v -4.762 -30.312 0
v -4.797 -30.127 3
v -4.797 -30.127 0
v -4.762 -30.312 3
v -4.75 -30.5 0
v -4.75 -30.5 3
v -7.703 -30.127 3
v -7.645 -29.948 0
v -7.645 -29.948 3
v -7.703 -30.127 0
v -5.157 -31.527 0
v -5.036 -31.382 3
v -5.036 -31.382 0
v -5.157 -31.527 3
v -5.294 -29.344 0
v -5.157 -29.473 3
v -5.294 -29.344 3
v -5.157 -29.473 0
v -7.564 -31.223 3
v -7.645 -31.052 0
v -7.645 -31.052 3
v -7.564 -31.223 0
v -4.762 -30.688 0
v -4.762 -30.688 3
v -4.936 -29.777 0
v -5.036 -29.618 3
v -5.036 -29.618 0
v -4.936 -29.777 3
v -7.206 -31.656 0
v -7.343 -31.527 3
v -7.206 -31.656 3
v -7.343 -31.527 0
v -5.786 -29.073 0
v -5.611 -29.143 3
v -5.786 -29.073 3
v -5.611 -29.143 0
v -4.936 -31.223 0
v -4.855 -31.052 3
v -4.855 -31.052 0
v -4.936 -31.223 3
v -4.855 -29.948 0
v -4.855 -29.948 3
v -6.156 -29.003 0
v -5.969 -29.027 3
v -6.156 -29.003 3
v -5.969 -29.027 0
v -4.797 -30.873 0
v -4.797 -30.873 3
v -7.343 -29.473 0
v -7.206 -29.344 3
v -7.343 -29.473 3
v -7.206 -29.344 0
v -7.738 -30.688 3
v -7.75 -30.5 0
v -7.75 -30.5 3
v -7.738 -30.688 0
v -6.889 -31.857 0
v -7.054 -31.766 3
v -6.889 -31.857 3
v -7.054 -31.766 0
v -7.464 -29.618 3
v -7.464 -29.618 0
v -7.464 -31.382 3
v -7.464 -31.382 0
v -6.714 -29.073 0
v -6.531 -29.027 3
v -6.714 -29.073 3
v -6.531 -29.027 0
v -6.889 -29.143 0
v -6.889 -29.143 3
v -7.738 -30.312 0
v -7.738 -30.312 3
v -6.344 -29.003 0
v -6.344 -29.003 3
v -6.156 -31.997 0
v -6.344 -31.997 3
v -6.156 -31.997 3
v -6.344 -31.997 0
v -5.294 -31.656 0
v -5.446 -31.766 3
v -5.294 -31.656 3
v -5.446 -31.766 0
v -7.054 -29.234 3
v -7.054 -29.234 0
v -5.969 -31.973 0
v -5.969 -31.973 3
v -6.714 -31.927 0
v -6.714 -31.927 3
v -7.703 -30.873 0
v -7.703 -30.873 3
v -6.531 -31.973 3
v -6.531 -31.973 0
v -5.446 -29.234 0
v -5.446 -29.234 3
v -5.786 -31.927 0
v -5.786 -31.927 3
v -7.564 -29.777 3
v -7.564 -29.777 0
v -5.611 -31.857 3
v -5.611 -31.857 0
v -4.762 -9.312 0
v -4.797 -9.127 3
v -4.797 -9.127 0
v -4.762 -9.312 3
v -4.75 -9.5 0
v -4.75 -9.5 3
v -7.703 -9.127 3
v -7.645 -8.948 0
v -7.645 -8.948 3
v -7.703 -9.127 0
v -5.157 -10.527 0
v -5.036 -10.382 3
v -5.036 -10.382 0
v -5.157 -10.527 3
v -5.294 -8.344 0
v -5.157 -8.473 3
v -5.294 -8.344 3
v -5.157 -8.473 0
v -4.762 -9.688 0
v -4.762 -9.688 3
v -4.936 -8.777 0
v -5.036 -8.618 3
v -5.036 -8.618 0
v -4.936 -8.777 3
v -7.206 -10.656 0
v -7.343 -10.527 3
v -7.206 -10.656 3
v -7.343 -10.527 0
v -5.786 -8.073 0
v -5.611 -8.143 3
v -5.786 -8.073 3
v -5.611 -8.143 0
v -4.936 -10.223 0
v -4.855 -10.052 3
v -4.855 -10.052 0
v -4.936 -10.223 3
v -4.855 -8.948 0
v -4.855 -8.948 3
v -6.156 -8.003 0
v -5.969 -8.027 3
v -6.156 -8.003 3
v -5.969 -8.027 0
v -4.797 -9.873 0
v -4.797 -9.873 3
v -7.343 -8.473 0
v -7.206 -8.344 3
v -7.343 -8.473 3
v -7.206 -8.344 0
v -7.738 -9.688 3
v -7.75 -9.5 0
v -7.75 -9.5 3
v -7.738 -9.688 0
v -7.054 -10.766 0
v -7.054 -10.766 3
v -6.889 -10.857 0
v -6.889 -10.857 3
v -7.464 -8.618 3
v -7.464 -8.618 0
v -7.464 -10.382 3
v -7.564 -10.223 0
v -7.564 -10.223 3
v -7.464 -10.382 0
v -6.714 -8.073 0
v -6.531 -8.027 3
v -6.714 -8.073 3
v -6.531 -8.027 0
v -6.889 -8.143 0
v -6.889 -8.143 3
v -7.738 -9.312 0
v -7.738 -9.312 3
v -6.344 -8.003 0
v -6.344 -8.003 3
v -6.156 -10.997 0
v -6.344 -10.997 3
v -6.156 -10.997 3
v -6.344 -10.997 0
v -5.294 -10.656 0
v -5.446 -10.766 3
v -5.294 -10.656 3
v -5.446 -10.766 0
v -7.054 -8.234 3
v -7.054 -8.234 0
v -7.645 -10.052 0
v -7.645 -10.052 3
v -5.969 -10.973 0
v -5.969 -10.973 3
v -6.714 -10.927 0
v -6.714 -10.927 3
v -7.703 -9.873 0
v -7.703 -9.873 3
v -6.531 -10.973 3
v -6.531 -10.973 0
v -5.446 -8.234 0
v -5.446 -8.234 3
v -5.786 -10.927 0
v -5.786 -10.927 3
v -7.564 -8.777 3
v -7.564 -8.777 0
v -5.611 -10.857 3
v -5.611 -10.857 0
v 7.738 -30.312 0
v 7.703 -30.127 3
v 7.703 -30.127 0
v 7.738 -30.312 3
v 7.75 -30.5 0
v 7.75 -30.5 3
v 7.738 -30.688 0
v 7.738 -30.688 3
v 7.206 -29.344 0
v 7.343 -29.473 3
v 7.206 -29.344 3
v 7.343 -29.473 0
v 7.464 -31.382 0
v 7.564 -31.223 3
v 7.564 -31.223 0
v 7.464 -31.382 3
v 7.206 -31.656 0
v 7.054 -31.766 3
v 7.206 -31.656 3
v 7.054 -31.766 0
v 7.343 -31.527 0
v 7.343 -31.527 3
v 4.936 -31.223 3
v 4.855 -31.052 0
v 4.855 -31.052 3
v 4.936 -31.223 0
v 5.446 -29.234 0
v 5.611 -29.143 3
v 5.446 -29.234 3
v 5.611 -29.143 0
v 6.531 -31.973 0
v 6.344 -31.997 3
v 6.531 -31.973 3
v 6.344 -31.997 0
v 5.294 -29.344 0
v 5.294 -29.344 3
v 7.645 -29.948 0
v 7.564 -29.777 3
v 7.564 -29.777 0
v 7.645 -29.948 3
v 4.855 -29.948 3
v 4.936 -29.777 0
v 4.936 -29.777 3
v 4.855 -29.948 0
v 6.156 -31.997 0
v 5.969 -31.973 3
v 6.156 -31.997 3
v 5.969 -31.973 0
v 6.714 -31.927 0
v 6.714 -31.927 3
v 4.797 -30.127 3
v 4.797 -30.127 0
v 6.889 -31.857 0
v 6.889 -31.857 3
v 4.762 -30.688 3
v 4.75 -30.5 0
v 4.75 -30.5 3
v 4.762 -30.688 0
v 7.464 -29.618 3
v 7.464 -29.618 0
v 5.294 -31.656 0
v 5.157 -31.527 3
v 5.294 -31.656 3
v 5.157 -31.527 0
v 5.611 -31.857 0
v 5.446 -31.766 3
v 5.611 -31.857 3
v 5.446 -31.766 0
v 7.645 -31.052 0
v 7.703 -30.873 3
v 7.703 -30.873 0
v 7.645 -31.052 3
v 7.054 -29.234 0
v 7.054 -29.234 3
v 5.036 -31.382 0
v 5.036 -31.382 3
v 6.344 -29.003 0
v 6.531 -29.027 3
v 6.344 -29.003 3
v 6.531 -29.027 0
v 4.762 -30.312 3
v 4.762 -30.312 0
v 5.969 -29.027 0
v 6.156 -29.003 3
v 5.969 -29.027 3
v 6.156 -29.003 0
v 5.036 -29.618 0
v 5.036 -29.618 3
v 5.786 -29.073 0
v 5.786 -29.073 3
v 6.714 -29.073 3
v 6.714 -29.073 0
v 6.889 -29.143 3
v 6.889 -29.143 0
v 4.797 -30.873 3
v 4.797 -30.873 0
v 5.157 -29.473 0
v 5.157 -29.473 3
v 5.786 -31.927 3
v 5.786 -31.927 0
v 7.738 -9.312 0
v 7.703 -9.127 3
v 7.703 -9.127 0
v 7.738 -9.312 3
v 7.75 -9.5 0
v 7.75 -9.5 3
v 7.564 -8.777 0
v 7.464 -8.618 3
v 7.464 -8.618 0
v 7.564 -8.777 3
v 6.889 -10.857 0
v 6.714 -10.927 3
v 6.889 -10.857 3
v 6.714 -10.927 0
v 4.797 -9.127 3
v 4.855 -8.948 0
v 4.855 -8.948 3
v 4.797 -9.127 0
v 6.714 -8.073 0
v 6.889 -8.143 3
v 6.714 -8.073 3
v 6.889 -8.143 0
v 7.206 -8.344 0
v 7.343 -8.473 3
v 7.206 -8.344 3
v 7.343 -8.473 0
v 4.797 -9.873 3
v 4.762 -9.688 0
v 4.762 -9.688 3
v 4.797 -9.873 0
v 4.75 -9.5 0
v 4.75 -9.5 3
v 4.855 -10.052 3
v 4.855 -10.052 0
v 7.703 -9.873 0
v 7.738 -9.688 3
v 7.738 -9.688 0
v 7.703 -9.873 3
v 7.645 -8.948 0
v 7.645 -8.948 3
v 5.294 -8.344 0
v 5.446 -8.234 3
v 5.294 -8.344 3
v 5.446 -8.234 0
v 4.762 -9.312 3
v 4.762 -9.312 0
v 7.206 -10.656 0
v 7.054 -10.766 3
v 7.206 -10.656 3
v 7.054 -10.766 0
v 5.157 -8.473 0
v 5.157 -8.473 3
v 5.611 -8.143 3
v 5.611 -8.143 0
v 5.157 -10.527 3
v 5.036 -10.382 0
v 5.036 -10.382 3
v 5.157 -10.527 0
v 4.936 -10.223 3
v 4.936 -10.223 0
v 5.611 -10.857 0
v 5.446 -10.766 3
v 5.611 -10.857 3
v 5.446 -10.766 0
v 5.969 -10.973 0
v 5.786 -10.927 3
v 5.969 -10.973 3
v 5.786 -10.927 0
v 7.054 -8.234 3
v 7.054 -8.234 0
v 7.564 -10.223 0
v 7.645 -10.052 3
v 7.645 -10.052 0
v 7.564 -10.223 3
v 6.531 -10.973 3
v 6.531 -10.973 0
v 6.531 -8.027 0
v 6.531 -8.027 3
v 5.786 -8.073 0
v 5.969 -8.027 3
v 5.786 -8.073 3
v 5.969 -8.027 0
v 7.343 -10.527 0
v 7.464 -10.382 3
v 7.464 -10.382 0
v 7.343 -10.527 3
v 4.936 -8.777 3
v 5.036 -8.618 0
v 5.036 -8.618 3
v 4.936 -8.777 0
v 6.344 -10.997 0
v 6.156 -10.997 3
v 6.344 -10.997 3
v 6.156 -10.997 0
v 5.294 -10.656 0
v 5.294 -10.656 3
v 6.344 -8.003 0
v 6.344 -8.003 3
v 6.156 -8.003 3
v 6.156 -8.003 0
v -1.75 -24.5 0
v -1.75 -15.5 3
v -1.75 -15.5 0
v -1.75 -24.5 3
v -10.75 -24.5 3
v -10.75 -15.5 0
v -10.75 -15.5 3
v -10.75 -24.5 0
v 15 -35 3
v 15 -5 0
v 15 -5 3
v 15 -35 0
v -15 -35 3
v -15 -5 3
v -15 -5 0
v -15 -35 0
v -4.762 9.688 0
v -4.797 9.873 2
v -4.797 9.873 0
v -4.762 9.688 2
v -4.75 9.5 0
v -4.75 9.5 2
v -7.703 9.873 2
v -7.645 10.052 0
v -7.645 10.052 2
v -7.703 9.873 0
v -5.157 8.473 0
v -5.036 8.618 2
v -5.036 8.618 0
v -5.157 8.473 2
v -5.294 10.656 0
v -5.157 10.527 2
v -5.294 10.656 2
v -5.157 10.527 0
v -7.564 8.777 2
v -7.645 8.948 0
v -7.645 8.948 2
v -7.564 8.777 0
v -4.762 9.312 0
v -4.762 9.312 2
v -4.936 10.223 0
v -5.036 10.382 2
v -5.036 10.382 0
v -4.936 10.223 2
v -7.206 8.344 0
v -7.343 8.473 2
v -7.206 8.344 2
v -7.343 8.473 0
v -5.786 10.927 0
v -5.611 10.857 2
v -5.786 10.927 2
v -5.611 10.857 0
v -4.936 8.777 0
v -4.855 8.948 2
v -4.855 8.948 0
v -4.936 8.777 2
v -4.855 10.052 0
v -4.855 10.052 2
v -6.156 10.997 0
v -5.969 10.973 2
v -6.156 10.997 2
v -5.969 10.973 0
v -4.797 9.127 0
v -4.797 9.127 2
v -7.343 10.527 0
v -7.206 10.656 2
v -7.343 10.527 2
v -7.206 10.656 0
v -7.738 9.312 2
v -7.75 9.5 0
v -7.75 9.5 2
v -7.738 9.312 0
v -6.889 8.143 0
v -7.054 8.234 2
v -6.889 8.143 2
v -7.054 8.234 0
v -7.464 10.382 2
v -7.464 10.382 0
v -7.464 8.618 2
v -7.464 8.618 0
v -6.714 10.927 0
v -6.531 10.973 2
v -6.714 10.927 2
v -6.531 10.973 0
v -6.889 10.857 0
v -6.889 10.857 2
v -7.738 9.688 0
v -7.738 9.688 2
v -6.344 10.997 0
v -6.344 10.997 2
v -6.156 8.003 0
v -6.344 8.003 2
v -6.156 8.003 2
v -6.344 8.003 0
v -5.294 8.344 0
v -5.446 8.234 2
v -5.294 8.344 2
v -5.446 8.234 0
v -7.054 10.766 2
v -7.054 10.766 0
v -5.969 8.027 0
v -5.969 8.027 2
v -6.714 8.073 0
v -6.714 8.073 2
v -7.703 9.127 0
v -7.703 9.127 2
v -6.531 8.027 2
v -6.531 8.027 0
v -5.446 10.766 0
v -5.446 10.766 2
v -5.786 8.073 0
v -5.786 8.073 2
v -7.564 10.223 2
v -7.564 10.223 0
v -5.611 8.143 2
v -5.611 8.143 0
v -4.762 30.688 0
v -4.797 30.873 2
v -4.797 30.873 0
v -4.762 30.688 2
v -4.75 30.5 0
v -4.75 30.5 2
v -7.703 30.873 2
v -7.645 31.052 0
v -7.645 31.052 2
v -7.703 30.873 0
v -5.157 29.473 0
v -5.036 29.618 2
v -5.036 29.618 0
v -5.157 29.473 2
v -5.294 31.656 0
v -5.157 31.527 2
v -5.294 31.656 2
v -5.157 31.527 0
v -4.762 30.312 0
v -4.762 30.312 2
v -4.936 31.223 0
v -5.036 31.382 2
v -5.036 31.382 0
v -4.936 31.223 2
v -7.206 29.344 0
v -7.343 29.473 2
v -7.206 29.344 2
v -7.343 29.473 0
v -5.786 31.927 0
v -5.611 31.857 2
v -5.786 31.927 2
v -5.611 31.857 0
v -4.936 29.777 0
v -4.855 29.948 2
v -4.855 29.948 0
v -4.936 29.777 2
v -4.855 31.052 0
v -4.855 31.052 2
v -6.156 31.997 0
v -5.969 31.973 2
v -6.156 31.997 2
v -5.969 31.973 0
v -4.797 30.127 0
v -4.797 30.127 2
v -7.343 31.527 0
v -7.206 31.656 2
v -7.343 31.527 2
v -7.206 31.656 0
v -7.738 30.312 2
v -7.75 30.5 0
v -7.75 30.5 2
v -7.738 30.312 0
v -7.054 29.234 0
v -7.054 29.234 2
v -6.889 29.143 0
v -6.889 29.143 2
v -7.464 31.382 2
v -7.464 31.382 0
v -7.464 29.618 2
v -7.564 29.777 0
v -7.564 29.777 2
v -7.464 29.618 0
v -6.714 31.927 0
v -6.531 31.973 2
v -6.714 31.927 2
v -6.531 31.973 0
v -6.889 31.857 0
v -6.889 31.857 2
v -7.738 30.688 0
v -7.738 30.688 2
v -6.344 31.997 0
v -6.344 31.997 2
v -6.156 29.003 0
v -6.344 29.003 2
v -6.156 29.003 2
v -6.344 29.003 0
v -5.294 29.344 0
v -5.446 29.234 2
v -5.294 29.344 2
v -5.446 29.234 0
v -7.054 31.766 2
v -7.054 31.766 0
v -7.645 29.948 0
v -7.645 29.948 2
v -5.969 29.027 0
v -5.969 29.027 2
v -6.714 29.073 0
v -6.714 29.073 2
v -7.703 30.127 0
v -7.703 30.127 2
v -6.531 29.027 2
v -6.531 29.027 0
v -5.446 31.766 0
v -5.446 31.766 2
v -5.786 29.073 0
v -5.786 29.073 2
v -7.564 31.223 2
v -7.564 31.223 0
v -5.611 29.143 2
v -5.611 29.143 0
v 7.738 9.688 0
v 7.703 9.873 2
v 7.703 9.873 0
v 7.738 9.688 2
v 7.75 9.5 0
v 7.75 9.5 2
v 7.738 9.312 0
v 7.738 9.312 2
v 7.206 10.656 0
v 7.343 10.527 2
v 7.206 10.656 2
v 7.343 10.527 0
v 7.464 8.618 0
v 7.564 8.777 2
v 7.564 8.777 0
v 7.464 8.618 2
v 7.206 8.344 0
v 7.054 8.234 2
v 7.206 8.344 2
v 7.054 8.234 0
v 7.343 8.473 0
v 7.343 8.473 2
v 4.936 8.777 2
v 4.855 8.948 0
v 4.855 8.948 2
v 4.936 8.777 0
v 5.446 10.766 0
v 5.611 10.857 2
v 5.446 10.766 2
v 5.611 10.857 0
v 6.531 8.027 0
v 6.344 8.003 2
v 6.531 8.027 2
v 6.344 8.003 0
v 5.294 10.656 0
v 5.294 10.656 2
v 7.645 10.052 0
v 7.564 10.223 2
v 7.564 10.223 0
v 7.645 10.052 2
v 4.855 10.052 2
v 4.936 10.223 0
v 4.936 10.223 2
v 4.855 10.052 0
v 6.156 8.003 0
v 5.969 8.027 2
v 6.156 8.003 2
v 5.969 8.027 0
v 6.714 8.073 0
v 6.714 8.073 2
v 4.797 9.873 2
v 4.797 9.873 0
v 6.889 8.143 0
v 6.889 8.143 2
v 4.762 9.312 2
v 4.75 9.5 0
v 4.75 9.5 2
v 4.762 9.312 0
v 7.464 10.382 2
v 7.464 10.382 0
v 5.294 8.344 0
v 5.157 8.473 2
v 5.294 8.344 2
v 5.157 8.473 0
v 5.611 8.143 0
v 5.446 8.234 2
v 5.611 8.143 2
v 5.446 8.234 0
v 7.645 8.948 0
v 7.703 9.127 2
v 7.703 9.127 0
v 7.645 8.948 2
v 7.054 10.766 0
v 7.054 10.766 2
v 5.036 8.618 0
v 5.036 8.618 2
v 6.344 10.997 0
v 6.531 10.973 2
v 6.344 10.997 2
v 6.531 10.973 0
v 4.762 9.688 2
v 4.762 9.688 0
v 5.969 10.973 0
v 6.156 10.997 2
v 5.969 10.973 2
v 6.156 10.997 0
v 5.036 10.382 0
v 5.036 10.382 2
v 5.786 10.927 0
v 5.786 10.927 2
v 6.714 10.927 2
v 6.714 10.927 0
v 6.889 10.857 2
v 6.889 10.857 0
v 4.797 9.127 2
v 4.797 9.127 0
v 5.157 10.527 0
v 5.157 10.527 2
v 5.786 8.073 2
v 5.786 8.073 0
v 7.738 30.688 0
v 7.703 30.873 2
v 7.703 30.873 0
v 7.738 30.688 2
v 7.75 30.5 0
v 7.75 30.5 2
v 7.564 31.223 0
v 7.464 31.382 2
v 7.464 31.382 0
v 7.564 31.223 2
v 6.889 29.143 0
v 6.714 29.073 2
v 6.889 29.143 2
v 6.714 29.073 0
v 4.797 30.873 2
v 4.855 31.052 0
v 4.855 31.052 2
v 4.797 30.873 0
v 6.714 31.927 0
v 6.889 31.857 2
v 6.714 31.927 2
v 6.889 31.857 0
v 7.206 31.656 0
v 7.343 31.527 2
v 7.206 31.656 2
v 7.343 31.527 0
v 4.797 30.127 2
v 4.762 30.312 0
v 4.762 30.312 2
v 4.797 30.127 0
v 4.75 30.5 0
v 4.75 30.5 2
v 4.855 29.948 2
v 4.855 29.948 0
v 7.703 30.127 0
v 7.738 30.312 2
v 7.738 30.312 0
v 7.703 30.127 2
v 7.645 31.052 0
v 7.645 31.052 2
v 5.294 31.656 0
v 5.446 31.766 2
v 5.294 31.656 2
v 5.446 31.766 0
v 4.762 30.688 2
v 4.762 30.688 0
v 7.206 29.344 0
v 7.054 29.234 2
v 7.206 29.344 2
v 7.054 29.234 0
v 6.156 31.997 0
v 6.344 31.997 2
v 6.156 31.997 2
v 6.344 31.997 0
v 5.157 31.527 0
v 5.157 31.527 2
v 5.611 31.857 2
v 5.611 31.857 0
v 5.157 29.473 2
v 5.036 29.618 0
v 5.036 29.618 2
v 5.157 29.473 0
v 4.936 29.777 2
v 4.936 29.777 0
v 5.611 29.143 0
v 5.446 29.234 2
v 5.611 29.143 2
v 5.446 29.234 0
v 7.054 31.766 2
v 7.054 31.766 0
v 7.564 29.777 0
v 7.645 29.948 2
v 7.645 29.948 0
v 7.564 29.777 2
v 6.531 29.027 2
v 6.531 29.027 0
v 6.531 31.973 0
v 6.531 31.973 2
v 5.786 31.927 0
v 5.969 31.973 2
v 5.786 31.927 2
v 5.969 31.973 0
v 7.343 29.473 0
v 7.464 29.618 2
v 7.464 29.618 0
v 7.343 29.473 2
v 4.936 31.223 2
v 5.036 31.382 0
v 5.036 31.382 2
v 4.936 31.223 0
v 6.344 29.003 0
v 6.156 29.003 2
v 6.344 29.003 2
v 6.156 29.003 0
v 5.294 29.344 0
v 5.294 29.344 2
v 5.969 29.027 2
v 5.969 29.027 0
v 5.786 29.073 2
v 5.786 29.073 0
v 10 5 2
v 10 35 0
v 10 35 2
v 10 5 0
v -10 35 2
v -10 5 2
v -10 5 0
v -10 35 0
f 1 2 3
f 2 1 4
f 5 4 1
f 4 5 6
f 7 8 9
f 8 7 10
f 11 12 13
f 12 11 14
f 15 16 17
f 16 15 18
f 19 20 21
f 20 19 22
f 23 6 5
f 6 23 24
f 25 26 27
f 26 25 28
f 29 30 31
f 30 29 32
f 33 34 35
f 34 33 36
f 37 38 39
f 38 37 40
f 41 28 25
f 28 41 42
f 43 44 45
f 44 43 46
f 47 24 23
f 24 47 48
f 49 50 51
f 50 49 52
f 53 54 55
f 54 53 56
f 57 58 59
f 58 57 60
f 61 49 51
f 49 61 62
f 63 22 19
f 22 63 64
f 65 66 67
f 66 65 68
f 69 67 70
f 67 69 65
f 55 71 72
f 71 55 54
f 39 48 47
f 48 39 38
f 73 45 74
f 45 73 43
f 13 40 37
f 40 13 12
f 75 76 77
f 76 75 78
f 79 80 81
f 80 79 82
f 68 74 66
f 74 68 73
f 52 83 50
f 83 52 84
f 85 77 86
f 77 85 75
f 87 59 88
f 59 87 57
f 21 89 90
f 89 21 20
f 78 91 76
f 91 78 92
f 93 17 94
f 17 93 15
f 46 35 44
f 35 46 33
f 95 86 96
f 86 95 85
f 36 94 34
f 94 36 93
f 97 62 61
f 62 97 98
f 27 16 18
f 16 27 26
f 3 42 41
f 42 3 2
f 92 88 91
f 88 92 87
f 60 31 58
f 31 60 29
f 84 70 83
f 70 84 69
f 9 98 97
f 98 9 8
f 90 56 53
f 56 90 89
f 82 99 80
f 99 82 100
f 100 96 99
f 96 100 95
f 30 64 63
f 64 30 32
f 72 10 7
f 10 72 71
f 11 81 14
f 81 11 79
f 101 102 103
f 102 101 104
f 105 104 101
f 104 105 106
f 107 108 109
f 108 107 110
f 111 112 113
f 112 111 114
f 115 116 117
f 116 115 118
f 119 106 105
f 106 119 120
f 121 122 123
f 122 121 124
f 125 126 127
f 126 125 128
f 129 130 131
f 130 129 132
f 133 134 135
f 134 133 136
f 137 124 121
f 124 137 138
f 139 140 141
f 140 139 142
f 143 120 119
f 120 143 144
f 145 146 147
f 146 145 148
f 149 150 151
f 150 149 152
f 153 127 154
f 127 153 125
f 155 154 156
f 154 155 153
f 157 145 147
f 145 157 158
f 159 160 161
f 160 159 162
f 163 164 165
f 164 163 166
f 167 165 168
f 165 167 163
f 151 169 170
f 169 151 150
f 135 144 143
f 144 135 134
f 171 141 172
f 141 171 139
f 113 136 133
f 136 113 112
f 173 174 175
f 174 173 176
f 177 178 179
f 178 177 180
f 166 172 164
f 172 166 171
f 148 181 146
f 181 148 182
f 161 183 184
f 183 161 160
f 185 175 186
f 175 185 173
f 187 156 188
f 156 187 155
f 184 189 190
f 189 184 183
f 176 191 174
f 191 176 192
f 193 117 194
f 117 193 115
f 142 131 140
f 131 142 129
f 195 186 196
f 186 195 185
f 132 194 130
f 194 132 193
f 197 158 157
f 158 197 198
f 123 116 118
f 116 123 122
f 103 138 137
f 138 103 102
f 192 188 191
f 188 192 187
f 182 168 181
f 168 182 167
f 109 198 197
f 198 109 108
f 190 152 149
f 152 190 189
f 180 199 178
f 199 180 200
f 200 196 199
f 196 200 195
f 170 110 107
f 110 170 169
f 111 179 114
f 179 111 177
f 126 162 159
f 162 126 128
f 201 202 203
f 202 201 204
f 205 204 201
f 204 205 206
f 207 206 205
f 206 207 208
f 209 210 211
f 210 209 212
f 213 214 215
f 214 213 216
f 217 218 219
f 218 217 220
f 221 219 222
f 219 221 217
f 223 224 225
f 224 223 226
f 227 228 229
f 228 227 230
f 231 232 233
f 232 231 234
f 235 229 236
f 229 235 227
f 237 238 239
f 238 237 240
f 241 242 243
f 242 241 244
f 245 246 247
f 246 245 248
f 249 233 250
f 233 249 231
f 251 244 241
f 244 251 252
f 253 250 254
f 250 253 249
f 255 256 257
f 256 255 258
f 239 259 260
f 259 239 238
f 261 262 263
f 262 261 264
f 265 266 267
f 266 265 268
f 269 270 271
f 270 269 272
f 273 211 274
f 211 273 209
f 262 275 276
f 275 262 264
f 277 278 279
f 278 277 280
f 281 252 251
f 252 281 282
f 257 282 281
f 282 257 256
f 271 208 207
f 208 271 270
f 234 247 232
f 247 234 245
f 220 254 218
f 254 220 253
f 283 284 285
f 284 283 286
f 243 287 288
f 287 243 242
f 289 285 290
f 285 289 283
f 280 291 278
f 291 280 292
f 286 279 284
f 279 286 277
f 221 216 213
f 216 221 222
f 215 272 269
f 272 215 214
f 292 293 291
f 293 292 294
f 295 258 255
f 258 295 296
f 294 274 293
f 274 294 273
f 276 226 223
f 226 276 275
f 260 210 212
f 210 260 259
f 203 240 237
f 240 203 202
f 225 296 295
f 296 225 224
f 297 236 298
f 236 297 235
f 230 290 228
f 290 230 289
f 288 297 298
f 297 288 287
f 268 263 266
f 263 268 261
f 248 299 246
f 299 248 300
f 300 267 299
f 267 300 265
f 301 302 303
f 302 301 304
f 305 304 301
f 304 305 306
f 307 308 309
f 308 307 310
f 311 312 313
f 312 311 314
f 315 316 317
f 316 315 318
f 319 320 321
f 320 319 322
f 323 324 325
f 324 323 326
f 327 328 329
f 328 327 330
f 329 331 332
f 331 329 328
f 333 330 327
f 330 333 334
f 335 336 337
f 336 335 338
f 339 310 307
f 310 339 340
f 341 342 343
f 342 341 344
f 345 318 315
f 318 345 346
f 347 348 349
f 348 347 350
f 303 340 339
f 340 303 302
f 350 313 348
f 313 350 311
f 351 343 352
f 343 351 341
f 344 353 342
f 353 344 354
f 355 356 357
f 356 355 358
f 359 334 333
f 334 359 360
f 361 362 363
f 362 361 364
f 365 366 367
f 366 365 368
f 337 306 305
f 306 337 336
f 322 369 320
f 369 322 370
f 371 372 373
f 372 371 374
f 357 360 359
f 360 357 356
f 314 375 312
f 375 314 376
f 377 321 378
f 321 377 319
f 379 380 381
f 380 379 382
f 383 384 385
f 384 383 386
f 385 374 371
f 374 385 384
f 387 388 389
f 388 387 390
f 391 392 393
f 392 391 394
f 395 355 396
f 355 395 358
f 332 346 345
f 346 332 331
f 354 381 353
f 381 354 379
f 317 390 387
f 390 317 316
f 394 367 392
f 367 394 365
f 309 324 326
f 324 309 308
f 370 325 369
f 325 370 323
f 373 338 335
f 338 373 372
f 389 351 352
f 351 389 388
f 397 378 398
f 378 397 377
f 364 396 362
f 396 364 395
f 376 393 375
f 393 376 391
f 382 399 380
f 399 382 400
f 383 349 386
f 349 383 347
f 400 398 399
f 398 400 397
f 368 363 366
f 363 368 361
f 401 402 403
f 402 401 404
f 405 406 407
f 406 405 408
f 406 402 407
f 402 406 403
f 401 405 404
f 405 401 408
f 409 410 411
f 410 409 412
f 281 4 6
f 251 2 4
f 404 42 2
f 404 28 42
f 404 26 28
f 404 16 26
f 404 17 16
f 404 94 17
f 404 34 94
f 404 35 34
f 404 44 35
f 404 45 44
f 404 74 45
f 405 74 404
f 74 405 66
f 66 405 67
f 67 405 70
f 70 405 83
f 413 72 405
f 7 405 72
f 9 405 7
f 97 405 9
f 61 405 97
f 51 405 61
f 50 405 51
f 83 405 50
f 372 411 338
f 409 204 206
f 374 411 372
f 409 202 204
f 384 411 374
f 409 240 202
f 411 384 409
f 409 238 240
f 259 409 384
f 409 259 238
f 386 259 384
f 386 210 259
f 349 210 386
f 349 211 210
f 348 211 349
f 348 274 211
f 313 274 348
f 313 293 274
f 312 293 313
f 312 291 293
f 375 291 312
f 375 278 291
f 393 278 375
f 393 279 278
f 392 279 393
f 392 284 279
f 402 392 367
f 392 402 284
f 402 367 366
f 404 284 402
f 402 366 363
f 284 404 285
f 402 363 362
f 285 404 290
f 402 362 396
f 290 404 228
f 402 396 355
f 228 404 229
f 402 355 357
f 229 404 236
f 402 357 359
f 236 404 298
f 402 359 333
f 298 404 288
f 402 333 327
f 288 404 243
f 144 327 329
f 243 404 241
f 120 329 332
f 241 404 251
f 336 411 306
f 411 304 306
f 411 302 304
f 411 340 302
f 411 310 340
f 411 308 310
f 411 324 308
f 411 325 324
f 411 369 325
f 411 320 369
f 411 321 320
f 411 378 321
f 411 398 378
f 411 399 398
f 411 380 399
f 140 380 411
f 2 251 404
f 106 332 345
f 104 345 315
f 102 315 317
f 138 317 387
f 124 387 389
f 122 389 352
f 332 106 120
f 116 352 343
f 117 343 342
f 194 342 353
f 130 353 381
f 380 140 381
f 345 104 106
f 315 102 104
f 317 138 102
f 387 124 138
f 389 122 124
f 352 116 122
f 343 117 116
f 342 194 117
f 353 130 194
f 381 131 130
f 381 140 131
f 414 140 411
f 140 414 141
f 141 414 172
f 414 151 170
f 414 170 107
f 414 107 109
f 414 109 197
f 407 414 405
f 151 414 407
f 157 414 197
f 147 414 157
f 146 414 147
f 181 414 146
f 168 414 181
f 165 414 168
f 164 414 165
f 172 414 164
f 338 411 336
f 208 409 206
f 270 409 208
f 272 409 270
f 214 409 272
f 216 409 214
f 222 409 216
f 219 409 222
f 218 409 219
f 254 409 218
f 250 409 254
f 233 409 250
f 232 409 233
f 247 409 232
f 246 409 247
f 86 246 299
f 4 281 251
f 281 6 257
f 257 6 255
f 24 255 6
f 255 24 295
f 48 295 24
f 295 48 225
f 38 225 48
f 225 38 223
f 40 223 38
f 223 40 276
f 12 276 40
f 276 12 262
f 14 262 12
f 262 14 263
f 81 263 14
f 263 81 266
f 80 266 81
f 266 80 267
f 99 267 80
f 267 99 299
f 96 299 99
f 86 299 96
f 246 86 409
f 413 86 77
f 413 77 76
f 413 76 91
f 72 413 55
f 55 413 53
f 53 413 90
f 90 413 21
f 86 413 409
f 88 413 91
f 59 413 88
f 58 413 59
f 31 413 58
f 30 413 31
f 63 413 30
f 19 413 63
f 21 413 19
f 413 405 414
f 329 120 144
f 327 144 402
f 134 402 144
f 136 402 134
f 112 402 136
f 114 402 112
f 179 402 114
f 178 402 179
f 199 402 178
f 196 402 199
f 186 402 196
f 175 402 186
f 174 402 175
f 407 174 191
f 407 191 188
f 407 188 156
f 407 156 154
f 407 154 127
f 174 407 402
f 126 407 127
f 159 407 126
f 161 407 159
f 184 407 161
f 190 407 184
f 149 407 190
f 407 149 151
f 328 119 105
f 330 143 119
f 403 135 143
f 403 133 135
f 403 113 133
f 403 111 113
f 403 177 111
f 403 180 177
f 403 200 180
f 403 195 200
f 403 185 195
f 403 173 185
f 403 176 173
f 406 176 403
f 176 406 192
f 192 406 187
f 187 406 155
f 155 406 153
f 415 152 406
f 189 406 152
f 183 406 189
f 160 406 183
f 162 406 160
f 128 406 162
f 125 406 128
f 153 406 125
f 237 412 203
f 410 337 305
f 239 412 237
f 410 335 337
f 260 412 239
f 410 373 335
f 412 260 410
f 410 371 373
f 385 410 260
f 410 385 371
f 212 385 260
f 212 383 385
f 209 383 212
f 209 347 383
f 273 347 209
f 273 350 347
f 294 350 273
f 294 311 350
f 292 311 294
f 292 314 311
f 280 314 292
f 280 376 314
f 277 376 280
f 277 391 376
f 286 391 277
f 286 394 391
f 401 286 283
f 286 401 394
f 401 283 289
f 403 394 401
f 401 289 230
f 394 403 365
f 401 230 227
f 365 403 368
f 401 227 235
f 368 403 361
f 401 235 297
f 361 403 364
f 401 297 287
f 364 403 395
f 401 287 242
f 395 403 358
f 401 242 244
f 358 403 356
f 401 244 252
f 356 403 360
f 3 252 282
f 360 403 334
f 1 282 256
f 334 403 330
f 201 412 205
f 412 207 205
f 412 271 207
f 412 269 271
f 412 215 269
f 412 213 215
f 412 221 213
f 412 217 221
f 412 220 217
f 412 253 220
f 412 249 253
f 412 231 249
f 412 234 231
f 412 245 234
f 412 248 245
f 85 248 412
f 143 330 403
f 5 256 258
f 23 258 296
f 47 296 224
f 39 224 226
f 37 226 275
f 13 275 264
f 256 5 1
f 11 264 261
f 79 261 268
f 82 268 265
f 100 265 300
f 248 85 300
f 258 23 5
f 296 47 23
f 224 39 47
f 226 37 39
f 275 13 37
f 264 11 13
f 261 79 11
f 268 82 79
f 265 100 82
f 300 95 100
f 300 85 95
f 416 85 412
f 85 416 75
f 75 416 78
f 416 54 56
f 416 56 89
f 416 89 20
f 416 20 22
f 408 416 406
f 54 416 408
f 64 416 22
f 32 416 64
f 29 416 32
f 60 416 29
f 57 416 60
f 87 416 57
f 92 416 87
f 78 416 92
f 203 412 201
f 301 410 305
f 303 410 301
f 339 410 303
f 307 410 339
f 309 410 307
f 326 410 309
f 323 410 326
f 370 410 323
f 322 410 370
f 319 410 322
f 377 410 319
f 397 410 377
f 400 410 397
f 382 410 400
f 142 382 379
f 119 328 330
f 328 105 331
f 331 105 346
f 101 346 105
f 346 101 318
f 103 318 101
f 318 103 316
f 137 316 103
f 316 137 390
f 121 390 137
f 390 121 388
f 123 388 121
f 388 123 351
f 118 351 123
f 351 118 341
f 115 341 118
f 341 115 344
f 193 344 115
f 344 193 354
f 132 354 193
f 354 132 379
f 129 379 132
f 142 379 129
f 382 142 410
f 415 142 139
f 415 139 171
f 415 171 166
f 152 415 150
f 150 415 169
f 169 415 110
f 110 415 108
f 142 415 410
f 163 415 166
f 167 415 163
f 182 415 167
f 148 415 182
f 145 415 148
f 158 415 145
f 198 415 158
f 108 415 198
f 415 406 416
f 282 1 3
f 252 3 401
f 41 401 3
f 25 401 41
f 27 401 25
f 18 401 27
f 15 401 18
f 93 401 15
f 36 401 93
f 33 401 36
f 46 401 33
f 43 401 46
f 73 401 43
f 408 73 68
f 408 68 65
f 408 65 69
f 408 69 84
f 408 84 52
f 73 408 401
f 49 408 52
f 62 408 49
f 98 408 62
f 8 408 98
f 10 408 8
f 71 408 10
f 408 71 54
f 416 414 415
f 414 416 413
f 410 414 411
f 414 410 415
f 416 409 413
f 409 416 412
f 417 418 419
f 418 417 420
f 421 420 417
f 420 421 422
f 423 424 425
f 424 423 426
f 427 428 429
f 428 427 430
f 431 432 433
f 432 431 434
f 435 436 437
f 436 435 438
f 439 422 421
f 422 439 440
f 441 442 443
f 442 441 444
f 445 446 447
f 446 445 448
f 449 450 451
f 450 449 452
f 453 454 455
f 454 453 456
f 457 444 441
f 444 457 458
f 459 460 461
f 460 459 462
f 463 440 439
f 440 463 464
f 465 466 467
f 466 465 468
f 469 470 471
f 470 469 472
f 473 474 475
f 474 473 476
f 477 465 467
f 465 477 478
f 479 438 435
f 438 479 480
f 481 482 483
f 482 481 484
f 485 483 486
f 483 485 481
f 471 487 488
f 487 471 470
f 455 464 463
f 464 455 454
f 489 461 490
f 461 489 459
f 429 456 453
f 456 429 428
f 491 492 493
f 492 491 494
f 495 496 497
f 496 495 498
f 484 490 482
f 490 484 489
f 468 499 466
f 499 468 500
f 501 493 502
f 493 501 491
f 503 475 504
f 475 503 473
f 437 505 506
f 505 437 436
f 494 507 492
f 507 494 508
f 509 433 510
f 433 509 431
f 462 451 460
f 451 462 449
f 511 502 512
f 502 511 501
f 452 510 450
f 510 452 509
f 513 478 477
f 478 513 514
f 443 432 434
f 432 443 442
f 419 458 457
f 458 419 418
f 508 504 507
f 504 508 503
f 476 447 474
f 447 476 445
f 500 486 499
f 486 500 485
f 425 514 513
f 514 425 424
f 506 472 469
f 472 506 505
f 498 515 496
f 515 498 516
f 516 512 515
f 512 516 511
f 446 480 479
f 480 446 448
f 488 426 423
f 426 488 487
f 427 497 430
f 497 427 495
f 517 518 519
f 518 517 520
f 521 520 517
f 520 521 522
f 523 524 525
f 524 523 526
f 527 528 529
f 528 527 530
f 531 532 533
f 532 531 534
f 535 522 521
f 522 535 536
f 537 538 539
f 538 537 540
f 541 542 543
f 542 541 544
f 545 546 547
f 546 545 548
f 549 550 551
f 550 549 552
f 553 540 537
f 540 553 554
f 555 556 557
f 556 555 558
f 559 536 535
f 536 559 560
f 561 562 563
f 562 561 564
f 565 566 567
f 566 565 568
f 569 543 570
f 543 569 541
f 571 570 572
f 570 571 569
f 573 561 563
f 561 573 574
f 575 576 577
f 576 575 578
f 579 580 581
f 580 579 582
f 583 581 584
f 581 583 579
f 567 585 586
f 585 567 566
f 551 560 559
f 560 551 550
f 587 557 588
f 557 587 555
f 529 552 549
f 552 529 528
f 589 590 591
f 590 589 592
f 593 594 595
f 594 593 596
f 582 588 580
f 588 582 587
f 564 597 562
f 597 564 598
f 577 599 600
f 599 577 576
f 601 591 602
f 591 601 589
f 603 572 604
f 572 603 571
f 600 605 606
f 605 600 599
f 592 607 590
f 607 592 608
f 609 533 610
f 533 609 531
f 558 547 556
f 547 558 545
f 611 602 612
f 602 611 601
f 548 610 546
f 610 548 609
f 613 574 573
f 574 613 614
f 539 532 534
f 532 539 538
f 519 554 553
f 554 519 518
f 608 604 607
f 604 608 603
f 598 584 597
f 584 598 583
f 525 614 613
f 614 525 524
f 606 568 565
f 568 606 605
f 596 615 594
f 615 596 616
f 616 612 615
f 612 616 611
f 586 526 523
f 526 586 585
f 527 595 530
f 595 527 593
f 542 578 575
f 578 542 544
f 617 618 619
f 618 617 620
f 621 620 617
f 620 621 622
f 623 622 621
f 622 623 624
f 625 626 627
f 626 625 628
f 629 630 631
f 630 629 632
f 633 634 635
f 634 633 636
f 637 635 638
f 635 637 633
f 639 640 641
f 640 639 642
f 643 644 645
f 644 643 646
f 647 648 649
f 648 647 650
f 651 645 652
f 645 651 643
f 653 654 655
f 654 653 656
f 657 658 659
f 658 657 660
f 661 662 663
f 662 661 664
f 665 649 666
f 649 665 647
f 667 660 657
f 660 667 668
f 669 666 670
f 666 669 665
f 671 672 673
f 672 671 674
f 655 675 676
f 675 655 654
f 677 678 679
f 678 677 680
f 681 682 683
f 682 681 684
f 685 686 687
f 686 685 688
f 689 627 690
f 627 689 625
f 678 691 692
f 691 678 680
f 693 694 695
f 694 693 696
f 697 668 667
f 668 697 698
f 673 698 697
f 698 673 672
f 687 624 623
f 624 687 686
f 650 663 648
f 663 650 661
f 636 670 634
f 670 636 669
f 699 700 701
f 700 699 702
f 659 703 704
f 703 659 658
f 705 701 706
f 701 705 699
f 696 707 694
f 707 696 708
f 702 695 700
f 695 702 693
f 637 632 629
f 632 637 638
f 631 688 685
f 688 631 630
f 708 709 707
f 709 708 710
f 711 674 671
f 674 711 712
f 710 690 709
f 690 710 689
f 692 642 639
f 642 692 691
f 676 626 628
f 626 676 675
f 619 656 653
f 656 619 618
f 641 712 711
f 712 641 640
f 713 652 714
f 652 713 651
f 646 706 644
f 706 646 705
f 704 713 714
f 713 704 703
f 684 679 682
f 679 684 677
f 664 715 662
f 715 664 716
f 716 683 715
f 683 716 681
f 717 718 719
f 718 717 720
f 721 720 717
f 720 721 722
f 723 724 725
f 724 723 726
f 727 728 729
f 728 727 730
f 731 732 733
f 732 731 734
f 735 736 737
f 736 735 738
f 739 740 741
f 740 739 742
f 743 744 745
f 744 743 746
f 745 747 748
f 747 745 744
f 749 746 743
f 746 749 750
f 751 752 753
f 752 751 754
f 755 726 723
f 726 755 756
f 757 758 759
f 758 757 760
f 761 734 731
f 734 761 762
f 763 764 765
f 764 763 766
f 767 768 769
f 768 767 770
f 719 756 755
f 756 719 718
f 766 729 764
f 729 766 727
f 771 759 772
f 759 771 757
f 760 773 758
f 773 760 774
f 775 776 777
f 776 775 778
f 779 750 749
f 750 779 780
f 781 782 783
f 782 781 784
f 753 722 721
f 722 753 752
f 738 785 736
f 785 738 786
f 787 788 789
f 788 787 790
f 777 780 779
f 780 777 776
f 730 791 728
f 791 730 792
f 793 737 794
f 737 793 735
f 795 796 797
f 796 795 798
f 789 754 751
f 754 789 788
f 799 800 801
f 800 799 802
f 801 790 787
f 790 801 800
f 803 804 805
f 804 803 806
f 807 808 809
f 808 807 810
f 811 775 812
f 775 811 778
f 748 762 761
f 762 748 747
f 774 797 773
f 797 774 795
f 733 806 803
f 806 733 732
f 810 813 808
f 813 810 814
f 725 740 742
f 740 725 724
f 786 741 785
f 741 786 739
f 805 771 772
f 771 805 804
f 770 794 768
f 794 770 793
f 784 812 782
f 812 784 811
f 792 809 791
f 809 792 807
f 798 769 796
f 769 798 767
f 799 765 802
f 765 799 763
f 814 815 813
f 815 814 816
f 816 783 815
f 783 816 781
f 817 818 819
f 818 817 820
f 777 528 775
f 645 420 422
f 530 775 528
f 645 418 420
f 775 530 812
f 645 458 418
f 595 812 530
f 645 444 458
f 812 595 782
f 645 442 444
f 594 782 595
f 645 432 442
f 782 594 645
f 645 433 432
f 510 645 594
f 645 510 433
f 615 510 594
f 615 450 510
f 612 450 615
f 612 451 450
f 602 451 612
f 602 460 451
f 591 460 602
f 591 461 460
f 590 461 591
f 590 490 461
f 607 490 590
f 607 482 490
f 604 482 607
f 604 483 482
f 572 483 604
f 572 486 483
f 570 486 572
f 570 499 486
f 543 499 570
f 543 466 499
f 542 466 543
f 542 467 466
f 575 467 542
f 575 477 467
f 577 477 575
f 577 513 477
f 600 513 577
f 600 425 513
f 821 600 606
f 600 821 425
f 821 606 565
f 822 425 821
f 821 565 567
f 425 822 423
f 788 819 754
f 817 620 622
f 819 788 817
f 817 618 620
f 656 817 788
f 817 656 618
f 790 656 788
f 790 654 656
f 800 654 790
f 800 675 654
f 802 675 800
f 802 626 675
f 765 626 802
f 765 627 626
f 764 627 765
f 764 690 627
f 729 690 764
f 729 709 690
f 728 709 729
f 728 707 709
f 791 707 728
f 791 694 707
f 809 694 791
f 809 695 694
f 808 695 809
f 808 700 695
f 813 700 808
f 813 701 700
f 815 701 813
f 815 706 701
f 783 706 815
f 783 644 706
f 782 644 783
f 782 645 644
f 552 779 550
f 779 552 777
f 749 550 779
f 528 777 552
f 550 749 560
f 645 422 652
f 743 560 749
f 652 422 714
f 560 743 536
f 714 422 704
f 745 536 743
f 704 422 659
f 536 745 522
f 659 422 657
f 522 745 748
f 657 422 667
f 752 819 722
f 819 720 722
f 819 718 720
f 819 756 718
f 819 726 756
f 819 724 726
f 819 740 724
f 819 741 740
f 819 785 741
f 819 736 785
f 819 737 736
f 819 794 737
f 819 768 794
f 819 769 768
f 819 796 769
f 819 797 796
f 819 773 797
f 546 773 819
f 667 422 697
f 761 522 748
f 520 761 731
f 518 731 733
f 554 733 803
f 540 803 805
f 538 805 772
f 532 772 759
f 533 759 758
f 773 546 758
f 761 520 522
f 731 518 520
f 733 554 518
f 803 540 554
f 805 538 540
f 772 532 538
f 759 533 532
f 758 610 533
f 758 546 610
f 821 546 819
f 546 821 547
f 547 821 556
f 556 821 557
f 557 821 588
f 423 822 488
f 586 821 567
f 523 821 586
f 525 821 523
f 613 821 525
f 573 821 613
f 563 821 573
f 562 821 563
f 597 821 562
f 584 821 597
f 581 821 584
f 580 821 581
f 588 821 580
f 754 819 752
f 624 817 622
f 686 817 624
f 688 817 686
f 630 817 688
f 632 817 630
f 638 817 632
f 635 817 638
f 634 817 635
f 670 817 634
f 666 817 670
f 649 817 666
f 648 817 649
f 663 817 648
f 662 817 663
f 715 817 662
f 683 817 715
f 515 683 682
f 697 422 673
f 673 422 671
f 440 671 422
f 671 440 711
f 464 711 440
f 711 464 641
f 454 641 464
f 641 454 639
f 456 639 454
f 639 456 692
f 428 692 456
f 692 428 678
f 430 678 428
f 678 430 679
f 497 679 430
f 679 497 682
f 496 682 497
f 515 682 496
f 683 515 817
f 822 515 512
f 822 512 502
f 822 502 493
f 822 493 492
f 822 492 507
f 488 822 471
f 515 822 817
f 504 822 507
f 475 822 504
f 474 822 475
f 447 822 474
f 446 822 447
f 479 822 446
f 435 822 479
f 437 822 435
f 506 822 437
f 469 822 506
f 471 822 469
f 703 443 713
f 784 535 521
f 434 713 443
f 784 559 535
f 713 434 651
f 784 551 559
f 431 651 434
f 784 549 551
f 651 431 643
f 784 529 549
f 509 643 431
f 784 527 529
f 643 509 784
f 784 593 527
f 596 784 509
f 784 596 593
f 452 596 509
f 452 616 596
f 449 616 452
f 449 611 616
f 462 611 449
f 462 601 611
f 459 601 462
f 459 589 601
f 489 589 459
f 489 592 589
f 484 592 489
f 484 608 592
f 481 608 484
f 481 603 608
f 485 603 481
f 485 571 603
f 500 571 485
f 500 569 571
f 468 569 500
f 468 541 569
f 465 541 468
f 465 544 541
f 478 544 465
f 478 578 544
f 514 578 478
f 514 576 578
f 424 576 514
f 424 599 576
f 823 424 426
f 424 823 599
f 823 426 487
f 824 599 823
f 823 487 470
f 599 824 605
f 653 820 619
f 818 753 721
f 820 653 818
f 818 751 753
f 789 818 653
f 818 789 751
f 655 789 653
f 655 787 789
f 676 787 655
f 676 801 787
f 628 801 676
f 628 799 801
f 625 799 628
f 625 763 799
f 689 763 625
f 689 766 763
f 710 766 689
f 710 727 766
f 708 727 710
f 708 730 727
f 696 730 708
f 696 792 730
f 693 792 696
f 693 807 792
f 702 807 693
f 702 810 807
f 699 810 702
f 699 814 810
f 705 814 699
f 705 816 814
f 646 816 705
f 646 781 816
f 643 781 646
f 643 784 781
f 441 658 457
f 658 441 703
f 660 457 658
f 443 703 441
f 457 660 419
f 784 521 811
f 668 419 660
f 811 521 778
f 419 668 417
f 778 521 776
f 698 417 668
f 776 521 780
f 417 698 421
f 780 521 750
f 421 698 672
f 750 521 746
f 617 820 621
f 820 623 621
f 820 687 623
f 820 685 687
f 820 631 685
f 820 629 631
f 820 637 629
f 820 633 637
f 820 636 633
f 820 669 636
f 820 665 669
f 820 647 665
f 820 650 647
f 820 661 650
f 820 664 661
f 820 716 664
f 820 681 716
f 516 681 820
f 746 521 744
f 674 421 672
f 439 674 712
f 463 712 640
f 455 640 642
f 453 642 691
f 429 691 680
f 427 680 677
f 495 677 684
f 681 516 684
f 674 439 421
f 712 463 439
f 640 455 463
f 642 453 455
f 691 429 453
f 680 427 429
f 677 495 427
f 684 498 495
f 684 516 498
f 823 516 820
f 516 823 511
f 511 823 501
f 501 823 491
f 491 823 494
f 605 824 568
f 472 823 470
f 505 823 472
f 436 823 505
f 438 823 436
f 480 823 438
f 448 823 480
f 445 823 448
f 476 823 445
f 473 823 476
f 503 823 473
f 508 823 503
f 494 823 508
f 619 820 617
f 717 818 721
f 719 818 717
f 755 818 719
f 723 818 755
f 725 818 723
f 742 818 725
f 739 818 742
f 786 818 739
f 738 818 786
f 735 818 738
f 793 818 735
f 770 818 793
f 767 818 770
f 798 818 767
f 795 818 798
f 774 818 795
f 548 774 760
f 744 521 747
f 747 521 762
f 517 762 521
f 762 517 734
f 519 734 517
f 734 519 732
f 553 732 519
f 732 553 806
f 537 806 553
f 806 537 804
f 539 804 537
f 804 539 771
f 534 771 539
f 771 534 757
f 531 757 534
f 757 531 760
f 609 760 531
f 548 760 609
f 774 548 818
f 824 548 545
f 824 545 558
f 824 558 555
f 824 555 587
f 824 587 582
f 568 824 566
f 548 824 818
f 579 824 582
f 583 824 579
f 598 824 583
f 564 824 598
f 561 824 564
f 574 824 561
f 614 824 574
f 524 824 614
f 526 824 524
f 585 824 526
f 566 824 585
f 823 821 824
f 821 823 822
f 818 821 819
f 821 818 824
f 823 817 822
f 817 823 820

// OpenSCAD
// Raspicam for Pibow (model B)
// A raspicam support for the Pibow case (Pimoroni).

// Copyright (c) 2014 Jérémie DECOCK <jd.jdhp@gmail.com>


// RASPICAM FRONT ///////////////////////////

module raspicam_front(board_width,
                      board_depth,
                      board_height) {

    // Check vars
    if(board_width < 16.5) echo("WARNING: board_width should be greater than or equal to 98");
    if(board_depth < 25)   echo("WARNING: board_depth should be greater than or equal to 65.5");

    // Local const
    screw_radius = 1.5;
    screw_spacing_x = 12.5;
    screw_spacing_y = 21;
    camera_slot_width = 9;

    difference() {
        cube([board_width, board_depth, board_height], center=true);

        #union() {
            // Four screw holes
            for (i = [-1, 1]) {    
                for (j = [-1, 1]) {    
                    translate([i*screw_spacing_x/2, j*screw_spacing_y/2, 0]) {        
                        cylinder(r=screw_radius, h=board_height+1, center=true, $fn=50);
                    }
                }
            }

            // Camera slot
            translate([-screw_spacing_x/2, 0, 0]){
                cube([camera_slot_width, camera_slot_width, board_height+1], center=true);
            }
        }
    }
}

// RASPICAM BACK ////////////////////////////

module raspicam_back(board_width,
                     board_depth,
                     board_height) {

    // Check vars
    if(board_width < 16.5) echo("WARNING: board_width should be greater than or equal to 98");
    if(board_depth < 25)   echo("WARNING: board_depth should be greater than or equal to 65.5");

    // Local const
    screw_radius = 1.5;
    screw_spacing_x = 12.5;
    screw_spacing_y = 21;

    difference() {
        cube([board_width, board_depth, board_height], center=true);

        #union() {
            // Four screw holes
            for (i = [-1, 1]) {    
                for (j = [-1, 1]) {    
                    translate([i*screw_spacing_x/2, j*screw_spacing_y/2, 0]) {        
                        cylinder(r=screw_radius, h=board_height+1, center=true, $fn=50);
                    }
                }
            }
        }
    }
}

/////////////////////////////////////////////

raspicam_front_width=30;  // x
raspicam_front_depth=30;  // y
raspicam_front_height=3;  // z

raspicam_back_width=20;   // x
raspicam_back_depth=30;   // y
raspicam_back_height=2;   // z

translate([0, -raspicam_front_depth/2 - 5, raspicam_front_height/2]) {
    raspicam_front(board_width  = raspicam_front_width,
                   board_depth  = raspicam_front_depth,
                   board_height = raspicam_front_height);
}

translate([0, raspicam_back_depth/2 + 5, raspicam_back_height/2]) {
    raspicam_back(board_width  = raspicam_back_width,
                  board_depth  = raspicam_back_depth,
                  board_height = raspicam_back_height);
}
